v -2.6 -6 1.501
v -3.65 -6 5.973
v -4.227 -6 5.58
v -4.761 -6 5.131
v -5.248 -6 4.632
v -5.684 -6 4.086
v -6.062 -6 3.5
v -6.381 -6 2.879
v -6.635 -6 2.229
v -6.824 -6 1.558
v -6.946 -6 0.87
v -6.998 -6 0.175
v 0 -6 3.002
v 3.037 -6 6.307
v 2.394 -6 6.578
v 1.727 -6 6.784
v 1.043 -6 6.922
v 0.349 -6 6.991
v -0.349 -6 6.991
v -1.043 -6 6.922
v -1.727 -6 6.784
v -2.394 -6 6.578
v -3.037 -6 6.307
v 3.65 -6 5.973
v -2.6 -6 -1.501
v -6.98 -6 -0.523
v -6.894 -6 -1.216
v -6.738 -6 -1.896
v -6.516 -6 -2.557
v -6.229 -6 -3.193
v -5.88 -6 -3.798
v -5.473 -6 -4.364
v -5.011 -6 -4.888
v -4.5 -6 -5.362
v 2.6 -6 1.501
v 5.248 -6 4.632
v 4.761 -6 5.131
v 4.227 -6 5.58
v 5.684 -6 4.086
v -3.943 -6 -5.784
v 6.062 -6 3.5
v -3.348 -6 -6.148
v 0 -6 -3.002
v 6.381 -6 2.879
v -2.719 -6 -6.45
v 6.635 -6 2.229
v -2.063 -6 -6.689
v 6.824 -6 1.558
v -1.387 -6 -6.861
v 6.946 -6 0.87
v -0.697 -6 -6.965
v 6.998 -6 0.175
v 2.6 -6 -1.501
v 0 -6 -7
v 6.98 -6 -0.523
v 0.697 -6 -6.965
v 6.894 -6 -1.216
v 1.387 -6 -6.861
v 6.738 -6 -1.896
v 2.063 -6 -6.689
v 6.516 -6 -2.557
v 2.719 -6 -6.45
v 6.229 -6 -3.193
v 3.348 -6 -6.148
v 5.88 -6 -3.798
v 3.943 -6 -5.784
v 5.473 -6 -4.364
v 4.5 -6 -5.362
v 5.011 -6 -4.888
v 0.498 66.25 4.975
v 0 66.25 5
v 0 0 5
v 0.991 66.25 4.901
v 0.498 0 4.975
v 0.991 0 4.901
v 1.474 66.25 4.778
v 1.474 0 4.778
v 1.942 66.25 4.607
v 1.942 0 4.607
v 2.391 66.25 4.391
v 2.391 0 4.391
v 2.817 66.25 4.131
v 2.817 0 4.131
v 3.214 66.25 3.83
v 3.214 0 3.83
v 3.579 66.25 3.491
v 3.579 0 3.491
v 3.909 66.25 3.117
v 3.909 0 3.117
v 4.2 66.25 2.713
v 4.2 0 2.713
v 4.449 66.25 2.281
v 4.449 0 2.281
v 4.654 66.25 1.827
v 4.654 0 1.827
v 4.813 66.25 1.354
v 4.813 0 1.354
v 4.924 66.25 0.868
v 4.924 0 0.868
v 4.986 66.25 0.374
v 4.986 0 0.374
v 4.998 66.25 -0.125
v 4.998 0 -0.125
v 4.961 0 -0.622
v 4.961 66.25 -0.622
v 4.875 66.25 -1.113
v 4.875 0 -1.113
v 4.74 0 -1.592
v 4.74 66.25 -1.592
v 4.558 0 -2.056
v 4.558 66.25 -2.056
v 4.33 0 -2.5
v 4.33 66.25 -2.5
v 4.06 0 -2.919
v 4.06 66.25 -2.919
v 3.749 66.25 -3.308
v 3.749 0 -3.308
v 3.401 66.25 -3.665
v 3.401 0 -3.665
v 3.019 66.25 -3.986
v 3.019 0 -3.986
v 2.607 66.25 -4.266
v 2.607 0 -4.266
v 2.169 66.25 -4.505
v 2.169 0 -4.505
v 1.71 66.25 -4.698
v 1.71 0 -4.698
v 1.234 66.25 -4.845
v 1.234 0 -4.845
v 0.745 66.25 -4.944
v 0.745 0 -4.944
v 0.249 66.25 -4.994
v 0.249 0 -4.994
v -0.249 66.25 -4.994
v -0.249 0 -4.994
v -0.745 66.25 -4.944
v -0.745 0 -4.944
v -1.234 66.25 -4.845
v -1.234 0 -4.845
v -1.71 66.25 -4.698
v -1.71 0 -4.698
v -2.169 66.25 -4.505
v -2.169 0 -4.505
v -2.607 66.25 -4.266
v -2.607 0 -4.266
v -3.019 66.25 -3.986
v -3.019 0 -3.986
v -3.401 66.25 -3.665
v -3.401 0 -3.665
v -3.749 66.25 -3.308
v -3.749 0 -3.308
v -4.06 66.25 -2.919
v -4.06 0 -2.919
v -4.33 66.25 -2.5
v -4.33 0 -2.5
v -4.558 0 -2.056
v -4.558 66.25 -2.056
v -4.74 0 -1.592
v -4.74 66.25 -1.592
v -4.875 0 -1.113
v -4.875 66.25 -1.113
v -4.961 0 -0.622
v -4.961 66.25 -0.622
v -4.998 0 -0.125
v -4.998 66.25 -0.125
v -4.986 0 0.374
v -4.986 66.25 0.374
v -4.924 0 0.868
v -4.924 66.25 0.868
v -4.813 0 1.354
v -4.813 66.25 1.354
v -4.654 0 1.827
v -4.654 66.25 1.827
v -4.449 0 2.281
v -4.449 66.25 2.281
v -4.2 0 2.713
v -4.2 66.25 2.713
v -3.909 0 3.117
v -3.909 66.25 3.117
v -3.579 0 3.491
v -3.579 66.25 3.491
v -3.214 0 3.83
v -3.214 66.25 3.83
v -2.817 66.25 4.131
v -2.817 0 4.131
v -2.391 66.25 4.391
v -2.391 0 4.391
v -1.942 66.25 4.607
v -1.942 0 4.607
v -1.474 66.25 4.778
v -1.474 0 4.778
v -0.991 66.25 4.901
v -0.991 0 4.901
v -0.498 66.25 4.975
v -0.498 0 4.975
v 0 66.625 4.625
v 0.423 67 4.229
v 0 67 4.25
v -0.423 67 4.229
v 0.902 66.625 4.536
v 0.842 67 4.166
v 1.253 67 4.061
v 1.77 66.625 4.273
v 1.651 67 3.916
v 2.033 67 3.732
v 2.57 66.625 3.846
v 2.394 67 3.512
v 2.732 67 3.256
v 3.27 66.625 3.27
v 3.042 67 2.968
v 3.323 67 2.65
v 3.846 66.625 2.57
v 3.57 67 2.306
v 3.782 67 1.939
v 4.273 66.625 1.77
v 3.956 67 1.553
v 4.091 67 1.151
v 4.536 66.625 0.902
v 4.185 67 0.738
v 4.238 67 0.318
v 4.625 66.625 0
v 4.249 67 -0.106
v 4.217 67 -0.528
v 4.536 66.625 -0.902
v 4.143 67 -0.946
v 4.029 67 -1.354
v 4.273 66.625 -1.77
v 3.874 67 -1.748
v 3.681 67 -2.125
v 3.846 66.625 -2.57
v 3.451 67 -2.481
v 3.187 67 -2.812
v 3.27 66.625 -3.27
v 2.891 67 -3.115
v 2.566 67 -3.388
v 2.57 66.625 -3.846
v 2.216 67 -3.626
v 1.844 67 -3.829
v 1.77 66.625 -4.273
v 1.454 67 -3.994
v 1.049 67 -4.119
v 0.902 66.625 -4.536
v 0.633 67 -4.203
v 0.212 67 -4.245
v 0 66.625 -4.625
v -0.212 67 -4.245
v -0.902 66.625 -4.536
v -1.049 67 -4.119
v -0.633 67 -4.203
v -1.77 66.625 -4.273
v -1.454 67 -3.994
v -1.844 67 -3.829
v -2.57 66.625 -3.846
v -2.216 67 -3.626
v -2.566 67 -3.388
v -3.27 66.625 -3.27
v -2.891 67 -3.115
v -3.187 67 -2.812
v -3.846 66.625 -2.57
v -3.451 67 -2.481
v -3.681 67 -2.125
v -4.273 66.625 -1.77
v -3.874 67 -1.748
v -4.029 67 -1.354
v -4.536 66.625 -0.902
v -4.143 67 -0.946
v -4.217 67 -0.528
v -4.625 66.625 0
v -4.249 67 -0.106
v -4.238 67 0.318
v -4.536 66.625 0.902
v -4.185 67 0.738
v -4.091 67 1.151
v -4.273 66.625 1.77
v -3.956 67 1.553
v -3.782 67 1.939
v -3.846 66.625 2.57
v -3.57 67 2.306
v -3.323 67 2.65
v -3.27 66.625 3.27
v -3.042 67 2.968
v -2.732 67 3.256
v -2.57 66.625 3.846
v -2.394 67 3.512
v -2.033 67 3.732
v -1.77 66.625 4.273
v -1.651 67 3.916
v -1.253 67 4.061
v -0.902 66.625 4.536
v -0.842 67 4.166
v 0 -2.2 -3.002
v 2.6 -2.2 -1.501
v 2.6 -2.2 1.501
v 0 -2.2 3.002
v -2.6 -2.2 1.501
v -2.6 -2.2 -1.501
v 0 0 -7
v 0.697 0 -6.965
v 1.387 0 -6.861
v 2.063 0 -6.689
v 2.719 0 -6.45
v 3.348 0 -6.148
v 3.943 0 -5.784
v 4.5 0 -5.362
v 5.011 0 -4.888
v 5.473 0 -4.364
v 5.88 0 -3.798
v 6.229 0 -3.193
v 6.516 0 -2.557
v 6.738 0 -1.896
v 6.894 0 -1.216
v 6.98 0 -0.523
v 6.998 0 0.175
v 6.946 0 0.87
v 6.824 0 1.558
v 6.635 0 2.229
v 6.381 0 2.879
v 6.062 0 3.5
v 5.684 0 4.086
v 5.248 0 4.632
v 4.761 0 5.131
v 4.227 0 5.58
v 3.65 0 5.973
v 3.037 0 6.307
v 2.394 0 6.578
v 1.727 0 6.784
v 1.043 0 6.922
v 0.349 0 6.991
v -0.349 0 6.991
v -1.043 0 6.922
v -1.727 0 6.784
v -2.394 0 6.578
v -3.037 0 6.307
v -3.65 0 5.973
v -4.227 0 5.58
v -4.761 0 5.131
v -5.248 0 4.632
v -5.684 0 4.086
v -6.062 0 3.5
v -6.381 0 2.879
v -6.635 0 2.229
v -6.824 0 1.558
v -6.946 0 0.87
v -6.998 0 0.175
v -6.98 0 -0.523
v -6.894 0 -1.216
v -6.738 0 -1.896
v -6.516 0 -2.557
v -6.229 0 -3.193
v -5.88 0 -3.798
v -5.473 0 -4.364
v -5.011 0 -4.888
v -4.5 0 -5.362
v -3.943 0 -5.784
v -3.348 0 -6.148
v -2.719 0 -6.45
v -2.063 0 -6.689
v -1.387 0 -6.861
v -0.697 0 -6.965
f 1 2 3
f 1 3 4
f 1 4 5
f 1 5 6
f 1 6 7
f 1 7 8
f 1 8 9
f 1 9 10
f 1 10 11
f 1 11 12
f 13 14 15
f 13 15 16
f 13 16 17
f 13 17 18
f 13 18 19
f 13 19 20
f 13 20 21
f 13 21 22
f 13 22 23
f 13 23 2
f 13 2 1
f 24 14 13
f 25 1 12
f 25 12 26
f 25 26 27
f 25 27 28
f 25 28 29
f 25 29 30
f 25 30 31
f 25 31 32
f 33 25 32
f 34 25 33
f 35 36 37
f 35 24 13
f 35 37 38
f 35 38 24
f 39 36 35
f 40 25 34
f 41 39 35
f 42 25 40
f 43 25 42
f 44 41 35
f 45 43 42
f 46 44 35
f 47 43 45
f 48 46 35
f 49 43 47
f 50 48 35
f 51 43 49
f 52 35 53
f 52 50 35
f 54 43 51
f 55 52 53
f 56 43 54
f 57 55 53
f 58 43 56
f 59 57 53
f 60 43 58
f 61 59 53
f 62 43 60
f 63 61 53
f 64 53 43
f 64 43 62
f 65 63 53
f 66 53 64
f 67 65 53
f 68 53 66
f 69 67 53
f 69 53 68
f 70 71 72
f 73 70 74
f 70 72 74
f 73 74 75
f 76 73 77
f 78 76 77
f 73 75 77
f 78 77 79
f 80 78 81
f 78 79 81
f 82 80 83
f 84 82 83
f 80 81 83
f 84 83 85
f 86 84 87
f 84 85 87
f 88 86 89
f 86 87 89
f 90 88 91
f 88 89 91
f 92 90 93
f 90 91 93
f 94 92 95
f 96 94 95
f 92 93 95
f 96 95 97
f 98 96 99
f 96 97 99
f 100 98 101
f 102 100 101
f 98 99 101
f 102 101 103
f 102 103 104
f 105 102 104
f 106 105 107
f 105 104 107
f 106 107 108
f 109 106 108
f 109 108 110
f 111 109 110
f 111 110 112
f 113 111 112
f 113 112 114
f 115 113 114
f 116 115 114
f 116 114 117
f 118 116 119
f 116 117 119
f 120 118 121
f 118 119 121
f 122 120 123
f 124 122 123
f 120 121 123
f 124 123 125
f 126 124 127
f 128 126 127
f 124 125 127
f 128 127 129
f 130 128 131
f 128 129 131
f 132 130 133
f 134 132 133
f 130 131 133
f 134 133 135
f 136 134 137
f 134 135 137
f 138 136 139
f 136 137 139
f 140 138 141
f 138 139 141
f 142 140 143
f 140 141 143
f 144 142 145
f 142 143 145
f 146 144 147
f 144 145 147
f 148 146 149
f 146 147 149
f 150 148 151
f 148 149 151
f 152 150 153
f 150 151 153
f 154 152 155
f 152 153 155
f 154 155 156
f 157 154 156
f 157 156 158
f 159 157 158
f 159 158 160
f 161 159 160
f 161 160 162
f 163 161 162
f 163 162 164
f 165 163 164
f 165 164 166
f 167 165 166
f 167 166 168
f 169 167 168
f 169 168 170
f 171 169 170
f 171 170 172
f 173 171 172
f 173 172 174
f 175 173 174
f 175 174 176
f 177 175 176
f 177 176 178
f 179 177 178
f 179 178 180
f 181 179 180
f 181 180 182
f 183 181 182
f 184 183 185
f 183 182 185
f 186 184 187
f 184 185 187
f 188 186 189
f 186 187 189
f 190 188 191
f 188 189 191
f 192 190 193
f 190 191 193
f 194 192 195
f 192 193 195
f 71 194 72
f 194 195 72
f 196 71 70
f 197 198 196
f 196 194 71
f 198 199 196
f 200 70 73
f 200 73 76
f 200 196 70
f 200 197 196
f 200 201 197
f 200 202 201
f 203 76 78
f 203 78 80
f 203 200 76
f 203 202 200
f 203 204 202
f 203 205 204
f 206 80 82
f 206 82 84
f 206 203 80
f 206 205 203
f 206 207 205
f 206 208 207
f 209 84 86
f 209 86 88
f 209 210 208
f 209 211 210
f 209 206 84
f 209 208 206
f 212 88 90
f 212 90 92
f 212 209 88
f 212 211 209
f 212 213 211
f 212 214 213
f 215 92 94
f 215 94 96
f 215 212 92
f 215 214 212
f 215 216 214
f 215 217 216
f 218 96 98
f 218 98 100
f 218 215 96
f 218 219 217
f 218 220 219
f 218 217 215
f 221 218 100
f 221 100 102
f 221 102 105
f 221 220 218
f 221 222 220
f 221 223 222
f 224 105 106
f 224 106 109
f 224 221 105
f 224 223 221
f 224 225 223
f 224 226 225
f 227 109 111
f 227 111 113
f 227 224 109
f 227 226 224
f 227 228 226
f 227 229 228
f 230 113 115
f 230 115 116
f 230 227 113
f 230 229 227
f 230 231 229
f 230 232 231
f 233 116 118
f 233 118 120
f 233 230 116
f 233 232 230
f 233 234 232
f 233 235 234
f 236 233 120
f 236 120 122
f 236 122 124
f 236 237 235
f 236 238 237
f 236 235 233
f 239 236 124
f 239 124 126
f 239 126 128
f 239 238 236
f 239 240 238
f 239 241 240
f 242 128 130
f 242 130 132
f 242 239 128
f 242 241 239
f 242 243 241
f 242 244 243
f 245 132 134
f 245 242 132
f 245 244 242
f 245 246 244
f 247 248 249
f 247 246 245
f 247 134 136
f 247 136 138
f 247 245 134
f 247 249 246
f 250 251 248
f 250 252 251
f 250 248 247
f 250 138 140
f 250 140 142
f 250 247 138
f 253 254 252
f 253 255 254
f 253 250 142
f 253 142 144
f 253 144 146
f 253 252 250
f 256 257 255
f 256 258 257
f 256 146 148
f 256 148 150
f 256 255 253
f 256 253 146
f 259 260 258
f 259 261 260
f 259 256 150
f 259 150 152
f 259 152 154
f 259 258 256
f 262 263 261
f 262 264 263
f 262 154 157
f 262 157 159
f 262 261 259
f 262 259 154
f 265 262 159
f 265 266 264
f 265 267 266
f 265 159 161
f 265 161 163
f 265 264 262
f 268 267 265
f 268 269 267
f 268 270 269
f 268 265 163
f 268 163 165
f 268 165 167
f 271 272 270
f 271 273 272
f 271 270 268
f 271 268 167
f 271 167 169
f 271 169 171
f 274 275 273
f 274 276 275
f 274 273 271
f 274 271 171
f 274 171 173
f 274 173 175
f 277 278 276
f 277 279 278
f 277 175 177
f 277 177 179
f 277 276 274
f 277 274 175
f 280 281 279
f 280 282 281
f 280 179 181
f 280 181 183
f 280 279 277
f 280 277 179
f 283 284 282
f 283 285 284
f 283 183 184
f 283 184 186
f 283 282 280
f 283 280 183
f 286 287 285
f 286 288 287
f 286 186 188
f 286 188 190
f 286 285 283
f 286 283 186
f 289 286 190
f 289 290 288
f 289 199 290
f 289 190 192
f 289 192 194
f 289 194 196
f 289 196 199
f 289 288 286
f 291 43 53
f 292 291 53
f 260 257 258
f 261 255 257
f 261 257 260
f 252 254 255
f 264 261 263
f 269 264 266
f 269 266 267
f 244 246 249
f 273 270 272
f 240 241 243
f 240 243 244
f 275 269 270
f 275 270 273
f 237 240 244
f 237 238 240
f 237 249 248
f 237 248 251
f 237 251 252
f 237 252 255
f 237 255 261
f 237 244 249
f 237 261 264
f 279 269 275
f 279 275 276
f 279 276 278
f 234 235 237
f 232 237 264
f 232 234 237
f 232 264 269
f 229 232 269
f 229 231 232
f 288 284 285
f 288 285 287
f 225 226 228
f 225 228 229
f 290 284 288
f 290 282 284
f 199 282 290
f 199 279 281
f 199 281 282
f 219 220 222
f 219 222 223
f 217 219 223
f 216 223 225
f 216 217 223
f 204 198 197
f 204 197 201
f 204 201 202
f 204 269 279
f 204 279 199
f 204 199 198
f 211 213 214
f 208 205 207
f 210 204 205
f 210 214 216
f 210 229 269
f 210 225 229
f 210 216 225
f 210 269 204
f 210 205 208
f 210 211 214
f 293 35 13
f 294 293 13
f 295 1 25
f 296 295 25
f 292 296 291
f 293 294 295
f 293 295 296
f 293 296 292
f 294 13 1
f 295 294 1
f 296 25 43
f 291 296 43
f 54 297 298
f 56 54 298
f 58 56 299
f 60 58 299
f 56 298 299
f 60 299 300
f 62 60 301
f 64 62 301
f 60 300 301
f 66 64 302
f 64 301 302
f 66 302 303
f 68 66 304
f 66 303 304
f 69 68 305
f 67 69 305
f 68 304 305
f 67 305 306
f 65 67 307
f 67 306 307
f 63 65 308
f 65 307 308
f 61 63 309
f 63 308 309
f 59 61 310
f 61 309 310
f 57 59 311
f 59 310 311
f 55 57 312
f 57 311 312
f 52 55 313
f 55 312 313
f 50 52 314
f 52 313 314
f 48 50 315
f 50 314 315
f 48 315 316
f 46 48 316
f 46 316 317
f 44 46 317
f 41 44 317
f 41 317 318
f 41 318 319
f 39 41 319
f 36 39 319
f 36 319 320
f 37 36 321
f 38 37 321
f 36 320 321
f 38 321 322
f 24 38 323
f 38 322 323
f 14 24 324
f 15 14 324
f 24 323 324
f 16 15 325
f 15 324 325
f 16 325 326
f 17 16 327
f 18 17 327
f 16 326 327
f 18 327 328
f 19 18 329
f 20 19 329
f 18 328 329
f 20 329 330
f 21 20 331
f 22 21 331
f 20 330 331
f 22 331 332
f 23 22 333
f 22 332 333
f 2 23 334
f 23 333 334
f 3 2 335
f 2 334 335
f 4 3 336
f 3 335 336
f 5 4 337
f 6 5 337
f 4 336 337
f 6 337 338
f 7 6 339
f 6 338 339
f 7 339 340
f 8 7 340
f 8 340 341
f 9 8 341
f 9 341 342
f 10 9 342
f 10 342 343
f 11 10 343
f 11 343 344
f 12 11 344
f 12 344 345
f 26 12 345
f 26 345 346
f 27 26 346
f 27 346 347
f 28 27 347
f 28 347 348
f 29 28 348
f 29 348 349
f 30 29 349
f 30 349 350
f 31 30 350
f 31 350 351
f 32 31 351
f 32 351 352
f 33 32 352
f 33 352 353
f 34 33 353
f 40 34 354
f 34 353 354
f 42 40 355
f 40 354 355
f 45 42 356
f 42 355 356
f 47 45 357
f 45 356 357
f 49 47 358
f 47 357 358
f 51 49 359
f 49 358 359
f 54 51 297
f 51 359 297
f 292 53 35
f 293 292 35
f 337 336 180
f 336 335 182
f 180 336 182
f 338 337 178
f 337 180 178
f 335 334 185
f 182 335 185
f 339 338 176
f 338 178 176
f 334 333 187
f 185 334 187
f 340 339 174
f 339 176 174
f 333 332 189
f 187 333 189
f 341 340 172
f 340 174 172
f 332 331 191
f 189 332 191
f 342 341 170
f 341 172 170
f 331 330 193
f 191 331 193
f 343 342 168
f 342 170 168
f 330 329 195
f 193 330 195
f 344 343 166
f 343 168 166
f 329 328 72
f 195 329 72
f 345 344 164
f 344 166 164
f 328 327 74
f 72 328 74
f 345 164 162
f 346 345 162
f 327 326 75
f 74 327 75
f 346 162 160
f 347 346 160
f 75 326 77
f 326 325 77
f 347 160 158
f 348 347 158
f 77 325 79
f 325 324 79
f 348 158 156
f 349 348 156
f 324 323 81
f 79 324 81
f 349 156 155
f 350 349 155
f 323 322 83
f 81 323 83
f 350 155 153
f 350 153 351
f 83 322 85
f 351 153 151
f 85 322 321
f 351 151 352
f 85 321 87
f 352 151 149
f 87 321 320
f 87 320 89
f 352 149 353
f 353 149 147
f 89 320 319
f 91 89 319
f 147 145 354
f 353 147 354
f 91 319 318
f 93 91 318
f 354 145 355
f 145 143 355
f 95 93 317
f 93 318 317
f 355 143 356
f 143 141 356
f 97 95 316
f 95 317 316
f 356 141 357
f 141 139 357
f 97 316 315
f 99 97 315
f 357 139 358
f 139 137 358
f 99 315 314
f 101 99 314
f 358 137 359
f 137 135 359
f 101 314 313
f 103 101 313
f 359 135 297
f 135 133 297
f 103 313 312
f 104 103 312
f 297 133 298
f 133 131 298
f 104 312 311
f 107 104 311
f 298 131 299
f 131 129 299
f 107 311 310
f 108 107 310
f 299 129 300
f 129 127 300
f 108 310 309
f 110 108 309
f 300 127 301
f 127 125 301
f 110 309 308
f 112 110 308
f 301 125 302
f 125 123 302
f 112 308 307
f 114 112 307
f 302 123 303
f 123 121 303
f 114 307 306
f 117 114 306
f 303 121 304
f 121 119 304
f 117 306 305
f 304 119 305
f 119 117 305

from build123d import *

# Parameters (mm, degrees)
SKETCH1_R           = 5
BOSS_EXTRUDE1_DEPTH = 67
CHAMFER1_SIZE       = 0.75
SKETCH2_R           = 7
BOSS_EXTRUDE2_DEPTH = 6
CUT_EXTRUDE1_DEPTH  = 3.8


with BuildPart() as part:
    # Sketch1 → Boss-Extrude1 (new body)
    with BuildSketch(Plane(origin=(0, 0, 0), x_dir=(1, 0, 0), z_dir=(0, 1, 0))):
        with Locations(Location((0, 0, 0), (0, 0, 270))):
            Circle(SKETCH1_R)
    extrude(amount=BOSS_EXTRUDE1_DEPTH)

    # Chamfer1
    chamfer1_edges = [part.edges().sort_by_distance(p)[0] for p in [
        (0, 67, -5),
    ]]
    chamfer(chamfer1_edges, length=CHAMFER1_SIZE)

    # Sketch2 → Boss-Extrude2 (add)
    with BuildSketch(Plane.XZ):
        with Locations(Location((0, 0, 0), (0, 0, 270))):
            Circle(SKETCH2_R)
    extrude(amount=BOSS_EXTRUDE2_DEPTH)

    # Sketch3 → Cut-Extrude1 (cut)
    with BuildSketch(Plane.XZ.offset(6)):
        Polygon((0, 3.0022214), (-2.6, 1.5011107), (-2.6, -1.5011107), (0, -3.0022214), (2.6, -1.5011107), (2.6, 1.5011107), align=None)
    extrude(amount=-CUT_EXTRUDE1_DEPTH, mode=Mode.SUBTRACT)


solid = part.part
